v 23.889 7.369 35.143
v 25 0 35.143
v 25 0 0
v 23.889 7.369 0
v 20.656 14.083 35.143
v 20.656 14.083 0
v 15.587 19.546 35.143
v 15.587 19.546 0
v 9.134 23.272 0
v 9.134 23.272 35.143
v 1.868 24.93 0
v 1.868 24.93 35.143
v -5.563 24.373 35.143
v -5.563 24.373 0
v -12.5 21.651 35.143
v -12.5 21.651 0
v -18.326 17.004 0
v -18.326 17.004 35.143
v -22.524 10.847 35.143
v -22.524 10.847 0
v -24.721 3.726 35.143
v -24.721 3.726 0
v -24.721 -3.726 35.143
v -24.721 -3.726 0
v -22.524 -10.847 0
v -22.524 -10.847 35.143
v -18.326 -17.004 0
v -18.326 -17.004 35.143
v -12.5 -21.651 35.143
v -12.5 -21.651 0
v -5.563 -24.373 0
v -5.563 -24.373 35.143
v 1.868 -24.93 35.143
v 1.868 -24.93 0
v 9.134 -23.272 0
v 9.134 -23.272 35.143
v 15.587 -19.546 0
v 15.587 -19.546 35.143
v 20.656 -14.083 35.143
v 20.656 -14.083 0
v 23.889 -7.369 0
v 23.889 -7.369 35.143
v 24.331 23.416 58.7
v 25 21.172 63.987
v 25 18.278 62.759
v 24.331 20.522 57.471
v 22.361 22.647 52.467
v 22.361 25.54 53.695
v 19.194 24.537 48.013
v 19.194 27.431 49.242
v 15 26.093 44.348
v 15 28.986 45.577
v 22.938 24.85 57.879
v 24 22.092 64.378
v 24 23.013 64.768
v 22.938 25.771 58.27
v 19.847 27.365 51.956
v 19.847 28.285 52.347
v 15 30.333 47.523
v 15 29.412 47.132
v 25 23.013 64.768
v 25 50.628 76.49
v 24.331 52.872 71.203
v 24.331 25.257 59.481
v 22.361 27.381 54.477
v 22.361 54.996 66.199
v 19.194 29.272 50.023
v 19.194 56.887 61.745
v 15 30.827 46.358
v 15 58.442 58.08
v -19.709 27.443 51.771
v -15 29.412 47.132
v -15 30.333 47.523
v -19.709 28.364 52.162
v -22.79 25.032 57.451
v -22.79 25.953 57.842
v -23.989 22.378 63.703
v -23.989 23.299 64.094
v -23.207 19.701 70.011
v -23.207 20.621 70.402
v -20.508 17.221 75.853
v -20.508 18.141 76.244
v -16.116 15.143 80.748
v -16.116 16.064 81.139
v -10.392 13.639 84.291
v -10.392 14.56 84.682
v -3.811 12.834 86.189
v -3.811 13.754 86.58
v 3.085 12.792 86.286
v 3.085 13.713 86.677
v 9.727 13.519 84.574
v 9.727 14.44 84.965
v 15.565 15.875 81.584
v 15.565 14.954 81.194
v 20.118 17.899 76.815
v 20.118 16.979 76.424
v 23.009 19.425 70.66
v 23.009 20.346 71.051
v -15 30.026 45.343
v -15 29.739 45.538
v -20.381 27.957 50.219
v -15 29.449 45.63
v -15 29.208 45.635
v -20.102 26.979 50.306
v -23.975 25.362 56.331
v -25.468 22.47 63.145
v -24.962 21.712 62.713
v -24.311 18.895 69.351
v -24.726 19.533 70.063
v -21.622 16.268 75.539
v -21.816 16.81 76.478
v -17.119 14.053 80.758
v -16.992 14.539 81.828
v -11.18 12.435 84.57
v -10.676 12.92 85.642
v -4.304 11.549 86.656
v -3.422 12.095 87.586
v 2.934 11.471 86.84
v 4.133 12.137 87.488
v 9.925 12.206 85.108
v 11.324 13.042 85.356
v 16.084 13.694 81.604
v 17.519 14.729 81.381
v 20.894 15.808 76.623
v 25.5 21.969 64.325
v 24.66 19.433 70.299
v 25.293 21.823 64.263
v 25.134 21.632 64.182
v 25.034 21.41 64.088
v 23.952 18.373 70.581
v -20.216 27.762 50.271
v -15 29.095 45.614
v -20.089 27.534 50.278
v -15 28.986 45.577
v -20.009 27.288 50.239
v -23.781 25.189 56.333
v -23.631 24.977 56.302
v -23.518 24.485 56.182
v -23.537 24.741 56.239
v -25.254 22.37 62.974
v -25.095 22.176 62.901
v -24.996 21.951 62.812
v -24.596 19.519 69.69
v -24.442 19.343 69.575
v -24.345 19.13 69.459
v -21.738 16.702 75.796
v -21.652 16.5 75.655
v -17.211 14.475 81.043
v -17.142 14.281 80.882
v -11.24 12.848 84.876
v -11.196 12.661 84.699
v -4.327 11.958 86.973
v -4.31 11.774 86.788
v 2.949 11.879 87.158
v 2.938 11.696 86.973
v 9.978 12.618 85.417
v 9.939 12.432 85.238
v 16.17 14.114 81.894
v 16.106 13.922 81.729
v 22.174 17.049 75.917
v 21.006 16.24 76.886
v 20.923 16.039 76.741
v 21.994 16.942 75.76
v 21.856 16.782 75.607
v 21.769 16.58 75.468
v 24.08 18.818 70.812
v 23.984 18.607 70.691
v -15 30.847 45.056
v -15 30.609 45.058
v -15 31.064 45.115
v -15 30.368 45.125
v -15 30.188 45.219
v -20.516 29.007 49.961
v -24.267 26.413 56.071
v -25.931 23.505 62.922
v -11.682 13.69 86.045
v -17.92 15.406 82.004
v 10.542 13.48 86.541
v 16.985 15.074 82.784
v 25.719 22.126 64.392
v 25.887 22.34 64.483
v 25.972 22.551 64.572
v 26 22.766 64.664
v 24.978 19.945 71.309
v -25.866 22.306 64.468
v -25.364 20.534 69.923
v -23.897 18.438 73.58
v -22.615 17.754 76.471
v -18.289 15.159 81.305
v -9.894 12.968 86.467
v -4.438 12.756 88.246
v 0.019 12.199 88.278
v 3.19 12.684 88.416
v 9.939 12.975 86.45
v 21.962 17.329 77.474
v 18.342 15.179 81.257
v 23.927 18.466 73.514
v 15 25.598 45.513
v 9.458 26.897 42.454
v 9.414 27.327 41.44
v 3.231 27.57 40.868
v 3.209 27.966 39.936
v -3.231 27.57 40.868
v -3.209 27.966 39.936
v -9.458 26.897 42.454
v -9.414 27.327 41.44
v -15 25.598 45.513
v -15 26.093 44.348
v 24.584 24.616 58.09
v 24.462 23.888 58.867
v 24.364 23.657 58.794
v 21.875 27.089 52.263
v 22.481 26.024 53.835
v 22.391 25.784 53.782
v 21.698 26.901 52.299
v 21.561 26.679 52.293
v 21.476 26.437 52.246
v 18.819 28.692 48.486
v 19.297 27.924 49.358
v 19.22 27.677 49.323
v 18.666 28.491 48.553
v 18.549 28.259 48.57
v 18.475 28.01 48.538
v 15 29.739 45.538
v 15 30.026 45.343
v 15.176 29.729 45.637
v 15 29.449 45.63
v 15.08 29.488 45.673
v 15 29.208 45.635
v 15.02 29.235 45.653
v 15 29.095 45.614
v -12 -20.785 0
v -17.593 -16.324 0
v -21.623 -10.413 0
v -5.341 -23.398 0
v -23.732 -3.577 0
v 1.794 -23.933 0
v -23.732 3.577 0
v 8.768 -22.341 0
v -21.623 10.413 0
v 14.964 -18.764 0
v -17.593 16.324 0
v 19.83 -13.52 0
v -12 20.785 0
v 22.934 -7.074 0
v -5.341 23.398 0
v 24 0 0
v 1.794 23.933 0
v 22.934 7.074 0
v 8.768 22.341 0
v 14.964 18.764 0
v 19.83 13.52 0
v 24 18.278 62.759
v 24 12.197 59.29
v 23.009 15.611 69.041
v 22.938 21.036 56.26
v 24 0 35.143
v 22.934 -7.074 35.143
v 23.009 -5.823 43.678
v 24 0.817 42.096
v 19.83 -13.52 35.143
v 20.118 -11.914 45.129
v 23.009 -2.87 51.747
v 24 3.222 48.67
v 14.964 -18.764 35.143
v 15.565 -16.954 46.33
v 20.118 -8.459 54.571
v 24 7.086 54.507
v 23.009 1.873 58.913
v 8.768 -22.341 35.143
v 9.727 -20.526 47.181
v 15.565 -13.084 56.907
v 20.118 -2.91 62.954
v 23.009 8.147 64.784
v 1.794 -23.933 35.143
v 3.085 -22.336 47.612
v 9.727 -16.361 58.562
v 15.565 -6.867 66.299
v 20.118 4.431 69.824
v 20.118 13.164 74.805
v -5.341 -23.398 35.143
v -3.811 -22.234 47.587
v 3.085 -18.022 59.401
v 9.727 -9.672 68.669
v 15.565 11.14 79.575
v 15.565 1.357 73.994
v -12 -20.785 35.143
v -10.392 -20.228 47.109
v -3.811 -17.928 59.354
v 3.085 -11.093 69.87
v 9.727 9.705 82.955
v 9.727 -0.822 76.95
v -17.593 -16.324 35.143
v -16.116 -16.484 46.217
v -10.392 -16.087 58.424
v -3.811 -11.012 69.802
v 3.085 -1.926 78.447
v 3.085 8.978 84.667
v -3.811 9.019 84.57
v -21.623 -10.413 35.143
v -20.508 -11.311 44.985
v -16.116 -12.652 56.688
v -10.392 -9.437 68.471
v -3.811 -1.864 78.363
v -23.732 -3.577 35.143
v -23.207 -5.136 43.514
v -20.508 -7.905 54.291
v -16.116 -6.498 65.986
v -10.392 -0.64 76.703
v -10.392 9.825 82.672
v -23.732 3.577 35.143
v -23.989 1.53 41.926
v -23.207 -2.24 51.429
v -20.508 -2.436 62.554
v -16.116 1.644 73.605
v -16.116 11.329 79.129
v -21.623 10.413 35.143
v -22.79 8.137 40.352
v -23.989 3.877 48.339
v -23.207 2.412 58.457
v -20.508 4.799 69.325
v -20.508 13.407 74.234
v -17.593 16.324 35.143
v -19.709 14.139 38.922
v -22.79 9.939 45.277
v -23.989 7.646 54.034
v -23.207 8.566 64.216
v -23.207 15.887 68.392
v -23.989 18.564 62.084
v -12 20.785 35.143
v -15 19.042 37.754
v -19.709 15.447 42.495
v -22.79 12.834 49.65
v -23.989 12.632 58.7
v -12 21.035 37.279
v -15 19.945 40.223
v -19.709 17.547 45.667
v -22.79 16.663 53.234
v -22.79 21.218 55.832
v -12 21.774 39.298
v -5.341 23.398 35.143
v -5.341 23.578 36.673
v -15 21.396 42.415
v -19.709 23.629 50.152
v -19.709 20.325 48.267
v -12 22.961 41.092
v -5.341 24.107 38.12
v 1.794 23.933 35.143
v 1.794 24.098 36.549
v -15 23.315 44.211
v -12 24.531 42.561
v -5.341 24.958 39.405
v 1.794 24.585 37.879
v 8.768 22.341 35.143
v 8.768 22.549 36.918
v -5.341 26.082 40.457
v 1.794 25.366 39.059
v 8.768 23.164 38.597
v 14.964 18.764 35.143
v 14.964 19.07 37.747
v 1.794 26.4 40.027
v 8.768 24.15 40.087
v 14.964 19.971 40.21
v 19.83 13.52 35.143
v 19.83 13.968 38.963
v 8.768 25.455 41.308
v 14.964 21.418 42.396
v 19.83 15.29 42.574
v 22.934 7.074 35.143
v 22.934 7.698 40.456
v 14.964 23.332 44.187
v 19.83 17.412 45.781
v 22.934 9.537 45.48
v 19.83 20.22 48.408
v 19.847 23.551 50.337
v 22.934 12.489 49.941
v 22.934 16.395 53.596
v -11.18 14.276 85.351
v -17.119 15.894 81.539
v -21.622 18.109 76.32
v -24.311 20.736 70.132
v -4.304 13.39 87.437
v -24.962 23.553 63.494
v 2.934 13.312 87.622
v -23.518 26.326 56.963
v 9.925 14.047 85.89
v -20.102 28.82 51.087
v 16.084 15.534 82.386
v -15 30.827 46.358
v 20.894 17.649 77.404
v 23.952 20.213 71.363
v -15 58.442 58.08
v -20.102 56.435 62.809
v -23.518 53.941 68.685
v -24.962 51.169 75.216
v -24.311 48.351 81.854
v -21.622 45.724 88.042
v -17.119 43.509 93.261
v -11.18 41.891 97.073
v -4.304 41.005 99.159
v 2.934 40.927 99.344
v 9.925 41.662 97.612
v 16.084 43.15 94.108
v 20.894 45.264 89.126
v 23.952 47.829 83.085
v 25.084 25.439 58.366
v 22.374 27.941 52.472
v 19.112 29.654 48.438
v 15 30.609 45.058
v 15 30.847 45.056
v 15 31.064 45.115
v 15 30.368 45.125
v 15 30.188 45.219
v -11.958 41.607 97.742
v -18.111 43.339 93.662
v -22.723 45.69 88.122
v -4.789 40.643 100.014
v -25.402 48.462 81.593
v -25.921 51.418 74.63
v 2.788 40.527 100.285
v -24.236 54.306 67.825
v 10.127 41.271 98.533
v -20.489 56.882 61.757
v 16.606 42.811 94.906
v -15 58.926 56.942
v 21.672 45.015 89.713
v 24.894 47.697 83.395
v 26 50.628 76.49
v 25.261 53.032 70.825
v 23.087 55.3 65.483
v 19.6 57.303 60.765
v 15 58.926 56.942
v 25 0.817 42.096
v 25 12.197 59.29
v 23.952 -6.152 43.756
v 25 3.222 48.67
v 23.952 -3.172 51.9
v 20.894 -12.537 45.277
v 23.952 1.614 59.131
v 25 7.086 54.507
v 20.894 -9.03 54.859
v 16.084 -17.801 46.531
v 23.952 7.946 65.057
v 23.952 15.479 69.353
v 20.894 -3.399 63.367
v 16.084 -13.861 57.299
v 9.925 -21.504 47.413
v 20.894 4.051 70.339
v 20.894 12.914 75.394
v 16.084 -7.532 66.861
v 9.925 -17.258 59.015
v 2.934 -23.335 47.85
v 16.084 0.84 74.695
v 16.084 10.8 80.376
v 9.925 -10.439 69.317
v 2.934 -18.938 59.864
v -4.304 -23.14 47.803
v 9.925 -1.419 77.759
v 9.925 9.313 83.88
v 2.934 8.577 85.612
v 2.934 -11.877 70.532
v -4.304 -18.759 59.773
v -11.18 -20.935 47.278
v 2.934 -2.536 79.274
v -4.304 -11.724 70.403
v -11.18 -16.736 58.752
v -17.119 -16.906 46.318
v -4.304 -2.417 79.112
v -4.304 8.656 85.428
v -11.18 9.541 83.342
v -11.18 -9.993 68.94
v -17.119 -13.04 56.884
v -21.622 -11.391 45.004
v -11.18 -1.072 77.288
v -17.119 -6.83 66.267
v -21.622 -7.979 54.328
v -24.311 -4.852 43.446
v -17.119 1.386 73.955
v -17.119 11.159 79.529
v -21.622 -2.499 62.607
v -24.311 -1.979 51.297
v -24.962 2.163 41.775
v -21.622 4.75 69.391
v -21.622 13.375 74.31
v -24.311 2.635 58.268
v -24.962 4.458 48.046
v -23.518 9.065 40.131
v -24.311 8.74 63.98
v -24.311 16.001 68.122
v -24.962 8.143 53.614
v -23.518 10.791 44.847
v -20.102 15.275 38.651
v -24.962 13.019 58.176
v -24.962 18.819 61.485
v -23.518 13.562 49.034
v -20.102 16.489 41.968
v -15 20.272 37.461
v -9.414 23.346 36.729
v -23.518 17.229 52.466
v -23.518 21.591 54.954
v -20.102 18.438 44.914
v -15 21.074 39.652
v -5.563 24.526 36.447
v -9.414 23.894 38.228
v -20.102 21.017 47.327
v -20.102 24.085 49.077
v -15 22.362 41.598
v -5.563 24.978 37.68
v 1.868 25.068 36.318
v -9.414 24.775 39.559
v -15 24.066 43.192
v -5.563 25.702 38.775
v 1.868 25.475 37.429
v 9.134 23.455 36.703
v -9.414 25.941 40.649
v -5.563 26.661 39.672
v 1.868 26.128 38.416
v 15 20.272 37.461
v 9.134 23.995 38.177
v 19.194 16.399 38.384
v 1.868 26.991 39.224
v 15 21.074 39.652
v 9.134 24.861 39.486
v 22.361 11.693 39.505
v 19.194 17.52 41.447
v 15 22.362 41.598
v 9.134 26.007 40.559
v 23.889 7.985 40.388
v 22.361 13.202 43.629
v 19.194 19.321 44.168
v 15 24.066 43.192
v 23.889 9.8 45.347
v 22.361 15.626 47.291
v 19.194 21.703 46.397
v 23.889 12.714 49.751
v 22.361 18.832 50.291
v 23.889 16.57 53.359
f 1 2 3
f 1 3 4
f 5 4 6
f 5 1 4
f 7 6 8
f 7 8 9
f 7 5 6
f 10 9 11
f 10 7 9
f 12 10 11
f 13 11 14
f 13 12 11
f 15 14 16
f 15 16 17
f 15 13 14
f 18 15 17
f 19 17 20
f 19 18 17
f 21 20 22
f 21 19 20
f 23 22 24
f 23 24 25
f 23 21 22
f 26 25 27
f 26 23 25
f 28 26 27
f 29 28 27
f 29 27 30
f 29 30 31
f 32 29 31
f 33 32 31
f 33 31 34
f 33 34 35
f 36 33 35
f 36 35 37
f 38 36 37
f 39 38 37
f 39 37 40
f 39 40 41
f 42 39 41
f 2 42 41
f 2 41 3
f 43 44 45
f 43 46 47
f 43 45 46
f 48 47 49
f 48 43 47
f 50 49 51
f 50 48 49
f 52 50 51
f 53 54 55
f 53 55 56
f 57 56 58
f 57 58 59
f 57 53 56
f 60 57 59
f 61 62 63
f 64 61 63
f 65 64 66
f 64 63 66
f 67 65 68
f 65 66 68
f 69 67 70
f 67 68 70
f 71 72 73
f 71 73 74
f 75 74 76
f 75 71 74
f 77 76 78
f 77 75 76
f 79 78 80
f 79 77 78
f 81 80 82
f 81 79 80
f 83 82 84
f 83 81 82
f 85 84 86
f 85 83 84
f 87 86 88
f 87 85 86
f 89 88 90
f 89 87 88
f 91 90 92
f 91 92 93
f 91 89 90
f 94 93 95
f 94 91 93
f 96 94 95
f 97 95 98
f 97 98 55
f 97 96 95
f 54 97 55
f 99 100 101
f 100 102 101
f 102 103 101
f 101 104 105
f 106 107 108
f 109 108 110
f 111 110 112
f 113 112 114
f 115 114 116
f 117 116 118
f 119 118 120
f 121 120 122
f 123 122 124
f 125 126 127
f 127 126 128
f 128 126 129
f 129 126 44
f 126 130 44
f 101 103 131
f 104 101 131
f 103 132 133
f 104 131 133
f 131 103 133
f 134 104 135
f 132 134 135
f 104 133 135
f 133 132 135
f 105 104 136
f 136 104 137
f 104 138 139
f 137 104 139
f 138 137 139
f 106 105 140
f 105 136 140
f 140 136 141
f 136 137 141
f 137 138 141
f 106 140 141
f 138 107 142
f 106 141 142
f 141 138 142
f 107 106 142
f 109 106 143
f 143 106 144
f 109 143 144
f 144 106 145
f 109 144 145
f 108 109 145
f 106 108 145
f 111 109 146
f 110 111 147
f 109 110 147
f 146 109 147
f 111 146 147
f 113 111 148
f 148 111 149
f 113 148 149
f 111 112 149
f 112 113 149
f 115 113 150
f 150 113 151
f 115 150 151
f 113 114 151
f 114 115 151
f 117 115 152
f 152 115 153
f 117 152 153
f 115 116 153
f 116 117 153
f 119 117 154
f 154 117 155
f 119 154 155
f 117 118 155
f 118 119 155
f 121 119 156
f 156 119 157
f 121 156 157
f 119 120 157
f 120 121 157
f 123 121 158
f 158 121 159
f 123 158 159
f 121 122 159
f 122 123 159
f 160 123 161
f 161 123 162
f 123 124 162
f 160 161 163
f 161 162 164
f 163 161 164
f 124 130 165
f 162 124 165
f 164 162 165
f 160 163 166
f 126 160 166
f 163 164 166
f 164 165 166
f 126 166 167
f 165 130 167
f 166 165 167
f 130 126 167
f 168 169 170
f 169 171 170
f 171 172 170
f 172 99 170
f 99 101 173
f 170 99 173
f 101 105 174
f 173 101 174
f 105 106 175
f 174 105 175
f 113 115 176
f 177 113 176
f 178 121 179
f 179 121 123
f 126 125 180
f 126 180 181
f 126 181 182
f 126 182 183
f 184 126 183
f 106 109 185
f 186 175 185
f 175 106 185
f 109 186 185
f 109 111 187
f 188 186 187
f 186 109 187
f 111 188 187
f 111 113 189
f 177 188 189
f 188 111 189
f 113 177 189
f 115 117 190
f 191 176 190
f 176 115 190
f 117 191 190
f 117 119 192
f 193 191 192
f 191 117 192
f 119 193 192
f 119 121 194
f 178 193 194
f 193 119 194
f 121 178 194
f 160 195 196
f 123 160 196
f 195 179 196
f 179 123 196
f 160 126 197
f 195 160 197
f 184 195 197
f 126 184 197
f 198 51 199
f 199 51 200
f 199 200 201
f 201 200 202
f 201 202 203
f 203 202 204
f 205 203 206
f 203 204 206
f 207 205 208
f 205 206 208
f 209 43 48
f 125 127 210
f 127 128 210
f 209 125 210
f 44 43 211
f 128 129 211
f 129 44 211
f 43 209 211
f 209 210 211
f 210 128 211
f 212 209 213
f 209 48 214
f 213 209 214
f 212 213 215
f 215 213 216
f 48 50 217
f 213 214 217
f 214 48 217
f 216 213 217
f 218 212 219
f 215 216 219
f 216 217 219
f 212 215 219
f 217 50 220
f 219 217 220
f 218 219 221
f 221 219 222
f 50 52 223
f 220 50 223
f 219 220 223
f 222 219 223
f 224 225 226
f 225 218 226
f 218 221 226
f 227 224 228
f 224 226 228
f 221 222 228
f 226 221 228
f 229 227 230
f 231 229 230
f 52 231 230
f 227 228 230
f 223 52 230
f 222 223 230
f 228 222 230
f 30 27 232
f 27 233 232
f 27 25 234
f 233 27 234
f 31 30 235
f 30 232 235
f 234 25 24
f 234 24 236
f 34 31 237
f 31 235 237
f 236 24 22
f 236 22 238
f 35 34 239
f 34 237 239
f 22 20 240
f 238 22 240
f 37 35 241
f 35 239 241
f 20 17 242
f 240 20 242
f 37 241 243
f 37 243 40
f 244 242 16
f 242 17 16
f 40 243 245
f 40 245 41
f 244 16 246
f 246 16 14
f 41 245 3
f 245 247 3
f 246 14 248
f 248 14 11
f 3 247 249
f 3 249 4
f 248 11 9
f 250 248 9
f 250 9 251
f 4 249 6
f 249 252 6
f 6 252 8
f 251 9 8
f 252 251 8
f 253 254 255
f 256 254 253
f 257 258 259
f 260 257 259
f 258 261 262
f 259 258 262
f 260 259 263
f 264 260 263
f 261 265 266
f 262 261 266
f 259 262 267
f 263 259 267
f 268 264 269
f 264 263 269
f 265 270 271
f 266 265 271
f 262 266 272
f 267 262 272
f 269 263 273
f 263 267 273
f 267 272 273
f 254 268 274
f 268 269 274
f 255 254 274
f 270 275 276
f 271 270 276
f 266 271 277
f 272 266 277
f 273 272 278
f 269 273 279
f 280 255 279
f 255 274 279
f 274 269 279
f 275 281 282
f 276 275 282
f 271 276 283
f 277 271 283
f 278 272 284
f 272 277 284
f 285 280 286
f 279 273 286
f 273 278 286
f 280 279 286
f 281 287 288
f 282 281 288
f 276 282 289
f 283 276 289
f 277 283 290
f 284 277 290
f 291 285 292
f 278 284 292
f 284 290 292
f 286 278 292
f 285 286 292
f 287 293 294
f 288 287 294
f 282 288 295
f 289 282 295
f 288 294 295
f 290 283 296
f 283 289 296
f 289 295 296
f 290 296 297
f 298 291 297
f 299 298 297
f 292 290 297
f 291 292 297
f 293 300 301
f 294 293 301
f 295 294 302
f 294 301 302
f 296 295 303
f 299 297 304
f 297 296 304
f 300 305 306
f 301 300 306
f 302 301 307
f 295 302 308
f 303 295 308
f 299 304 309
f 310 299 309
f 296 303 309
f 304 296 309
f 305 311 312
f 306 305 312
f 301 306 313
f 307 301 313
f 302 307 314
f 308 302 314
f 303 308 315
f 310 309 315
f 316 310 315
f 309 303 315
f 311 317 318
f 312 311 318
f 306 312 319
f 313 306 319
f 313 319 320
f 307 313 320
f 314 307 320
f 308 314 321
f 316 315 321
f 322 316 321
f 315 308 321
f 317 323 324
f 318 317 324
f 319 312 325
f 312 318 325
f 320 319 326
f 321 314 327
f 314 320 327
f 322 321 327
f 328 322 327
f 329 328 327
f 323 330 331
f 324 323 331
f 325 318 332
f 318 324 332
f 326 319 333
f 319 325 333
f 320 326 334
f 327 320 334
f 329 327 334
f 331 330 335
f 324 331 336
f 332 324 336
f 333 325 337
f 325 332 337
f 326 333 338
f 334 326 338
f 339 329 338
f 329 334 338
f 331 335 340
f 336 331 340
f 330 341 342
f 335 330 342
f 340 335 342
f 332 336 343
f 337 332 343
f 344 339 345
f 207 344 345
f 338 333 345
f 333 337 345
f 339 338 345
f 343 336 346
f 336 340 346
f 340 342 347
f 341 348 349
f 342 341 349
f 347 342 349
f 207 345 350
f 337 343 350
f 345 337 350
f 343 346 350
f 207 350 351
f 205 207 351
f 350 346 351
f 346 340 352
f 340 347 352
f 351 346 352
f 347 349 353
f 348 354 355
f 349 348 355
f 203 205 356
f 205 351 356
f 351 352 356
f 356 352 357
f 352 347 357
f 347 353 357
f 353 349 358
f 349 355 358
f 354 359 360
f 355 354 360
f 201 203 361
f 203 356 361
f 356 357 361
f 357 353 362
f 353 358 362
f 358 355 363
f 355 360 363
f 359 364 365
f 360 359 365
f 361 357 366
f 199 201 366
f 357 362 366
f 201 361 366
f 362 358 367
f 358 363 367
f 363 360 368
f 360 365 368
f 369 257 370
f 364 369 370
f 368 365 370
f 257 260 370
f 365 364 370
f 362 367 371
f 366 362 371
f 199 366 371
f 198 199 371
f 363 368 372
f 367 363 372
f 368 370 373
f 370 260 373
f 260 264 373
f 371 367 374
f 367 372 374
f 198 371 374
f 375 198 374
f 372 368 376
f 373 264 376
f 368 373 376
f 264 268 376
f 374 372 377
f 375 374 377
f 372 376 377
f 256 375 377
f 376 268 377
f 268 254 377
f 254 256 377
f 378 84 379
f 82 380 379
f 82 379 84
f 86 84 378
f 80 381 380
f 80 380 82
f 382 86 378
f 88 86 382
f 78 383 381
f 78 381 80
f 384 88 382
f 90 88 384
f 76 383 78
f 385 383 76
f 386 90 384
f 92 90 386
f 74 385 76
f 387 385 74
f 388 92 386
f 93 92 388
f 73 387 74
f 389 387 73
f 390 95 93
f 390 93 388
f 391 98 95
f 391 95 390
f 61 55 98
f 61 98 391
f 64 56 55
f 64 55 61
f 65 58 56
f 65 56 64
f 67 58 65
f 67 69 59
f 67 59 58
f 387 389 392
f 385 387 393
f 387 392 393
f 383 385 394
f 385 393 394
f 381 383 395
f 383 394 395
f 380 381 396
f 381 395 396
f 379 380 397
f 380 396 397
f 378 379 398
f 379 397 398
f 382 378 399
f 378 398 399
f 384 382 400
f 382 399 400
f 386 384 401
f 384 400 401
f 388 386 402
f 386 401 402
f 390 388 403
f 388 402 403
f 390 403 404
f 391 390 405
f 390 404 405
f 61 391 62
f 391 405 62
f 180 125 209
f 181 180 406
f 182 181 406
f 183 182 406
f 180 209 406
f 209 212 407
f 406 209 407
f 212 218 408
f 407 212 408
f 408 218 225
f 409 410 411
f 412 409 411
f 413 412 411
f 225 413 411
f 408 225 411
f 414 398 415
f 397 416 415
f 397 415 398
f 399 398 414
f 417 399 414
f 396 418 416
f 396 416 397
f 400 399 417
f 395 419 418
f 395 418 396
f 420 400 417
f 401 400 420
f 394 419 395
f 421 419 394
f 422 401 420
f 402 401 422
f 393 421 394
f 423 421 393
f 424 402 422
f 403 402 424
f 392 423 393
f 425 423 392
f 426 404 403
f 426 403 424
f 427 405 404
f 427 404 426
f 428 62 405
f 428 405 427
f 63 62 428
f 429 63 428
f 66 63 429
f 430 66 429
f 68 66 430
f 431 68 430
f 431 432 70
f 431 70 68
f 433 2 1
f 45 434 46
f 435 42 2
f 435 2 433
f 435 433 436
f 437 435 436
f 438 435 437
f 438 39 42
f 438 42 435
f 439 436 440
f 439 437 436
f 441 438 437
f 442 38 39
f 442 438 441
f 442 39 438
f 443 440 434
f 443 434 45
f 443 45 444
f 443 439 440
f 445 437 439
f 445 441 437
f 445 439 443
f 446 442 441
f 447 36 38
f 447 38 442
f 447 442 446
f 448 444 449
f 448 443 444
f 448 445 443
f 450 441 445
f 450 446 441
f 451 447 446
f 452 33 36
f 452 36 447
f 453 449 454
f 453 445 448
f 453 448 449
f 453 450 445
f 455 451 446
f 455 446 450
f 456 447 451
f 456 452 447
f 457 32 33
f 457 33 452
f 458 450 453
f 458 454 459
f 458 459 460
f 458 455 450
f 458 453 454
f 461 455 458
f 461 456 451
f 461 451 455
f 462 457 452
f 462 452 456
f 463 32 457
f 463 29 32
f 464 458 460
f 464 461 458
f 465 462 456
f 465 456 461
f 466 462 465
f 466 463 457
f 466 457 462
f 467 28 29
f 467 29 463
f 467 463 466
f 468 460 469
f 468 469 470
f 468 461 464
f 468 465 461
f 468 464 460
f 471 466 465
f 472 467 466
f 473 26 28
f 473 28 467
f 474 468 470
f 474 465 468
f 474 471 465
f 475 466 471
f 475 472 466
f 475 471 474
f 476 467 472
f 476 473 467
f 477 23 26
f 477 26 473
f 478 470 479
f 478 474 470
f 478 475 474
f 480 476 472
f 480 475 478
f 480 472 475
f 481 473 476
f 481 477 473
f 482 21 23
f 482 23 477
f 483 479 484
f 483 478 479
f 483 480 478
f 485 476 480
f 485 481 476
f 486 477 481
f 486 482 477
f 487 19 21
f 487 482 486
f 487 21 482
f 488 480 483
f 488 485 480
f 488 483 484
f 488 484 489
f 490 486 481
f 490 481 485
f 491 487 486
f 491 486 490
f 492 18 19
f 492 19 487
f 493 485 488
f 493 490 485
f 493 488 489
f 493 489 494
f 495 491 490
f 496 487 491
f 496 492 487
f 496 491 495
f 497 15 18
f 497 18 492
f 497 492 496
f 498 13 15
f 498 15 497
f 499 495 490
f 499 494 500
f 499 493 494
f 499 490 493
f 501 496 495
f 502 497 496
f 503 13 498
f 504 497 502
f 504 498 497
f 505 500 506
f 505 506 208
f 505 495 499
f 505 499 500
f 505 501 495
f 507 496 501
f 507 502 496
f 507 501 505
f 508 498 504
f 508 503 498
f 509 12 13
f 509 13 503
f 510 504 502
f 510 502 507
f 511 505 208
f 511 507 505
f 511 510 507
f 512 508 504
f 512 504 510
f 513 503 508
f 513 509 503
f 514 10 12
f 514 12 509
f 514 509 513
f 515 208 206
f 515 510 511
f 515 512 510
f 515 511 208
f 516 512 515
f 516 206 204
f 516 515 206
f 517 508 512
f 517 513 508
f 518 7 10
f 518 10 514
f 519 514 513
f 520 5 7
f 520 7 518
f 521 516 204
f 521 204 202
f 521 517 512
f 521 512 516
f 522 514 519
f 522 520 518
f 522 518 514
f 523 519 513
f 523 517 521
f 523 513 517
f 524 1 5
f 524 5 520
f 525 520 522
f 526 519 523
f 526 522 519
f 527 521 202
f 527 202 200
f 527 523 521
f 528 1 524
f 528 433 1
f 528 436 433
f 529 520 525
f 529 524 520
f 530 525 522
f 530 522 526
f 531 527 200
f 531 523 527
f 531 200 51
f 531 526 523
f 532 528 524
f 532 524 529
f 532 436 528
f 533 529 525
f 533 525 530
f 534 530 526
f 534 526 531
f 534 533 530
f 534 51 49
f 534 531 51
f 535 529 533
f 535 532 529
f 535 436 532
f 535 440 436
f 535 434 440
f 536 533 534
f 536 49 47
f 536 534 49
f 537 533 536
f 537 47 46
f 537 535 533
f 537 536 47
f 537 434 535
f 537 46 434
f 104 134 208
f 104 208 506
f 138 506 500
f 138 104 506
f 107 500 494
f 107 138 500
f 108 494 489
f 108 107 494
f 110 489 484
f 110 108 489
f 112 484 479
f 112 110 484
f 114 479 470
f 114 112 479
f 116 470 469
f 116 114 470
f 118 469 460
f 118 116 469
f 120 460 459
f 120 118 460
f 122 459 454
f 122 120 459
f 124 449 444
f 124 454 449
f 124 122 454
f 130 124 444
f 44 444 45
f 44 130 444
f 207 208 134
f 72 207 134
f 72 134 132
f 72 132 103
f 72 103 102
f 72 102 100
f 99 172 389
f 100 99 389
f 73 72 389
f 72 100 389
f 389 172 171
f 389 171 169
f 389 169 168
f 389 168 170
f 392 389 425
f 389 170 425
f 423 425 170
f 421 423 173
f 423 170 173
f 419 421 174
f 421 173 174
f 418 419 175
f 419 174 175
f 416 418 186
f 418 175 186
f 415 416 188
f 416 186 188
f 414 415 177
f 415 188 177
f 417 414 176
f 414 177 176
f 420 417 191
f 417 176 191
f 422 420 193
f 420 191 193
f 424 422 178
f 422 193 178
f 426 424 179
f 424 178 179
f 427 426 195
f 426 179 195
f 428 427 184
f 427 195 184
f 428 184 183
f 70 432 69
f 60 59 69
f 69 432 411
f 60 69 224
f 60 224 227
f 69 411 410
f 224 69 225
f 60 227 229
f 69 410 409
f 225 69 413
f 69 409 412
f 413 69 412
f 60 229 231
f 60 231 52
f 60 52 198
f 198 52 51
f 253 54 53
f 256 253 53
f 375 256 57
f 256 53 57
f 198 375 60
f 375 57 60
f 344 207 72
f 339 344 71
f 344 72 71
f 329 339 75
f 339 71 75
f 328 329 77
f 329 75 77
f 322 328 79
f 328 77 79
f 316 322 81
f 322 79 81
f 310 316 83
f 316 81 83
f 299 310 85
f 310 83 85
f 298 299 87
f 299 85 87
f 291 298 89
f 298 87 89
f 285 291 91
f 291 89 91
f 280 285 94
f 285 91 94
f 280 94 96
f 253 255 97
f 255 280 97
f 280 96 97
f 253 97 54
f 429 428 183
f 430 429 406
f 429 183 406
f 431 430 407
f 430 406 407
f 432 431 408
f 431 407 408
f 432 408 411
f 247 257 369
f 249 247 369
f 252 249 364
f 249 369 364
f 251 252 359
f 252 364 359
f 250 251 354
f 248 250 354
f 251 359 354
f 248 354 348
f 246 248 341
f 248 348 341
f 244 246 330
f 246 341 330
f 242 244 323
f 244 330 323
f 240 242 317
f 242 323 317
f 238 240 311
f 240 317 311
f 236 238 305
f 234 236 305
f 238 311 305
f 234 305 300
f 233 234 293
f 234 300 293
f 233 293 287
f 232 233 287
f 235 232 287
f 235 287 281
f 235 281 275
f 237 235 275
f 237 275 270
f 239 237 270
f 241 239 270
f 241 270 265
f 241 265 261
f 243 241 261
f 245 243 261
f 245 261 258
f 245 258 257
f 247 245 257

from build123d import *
from build123d.topology import SkipClean

# Parameters (mm, degrees)
ESQUISSE6_R             = 25
ESQUISSE6_R_2           = 24
ESQUISSE8_R             = 26
ESQUISSE8_R_2           = 24
EXTRU_MINCE1_DEPTH      = 1
EXTRU_MINCE2_START      = 30
ESQUISSE9_R             = 26
ESQUISSE9_R_2           = 25
EXTRU_MINCE2_DEPTH      = 30
CONG_1_R                = 1
CONG_2_R                = 1
ENL_V_MAT_EXTRU_1_DEPTH = 40


with BuildPart() as part:
    # Balayage-Mince2: sweep along a path in Esquisse7
    with BuildLine(Plane(origin=(0, 0, 0), x_dir=(0, 0, -1), z_dir=(1, 0, 0))) as balayage_mince2_path:
        Line((0, 0), (-35.14343316412919, -3.47e-15))
        ThreePointArc((-35.14343316412919, -3.47e-15), (-51.70154272349097, 4.983425337984965), (-62.75857876770245, 18.27806614532184))
        Line((-62.75857876770245, 18.27806614532184), (-64.37754708374251, 22.092116482858586))
    # Esquisse6 → Balayage-Mince2 (sweep)
    with BuildSketch(Plane.XY):
        Circle(ESQUISSE6_R)
        Circle(ESQUISSE6_R_2, mode=Mode.SUBTRACT)
    sweep(path=balayage_mince2_path.line)



with BuildPart() as body_2:
    # Esquisse8 → Extru.-Mince1 (new body)
    with BuildSketch(Plane(origin=(0, 41.87396099217143, 17.77444189612002), x_dir=(1, 0, 0), z_dir=(0, 0.9205048534524412, 0.39073112848927183))):
        with Locations((0, -50.62776693988426)):
            Circle(ESQUISSE8_R)
        with Locations((0, -50.62776693988426)):
            Circle(ESQUISSE8_R_2, mode=Mode.SUBTRACT)
    extrude(amount=EXTRU_MINCE1_DEPTH)


with BuildPart() as part_1:
    add(part.part)

    add(body_2.part)  # Extru.-Mince2 merges body 2
    # Esquisse9 → Extru.-Mince2 (add)
    with BuildSketch(Plane(origin=(0, 42.794465845623876, 18.16517302460929), x_dir=(1, 0, 0), z_dir=(0, 0.9205048534524412, 0.39073112848927183)).offset(EXTRU_MINCE2_START)):
        with Locations((0, -50.627766939884246)):
            Circle(ESQUISSE9_R)
        with Locations((0, -50.627766939884246)):
            Circle(ESQUISSE9_R_2, mode=Mode.SUBTRACT)
    extrude(amount=-EXTRU_MINCE2_DEPTH)

    # Congé1
    cong_1_edges = [part_1.edges().sort_by_distance(p)[0] for p in [
        (-25, 22.09211648285859, 64.3775470837425),
    ]]
    fillet(cong_1_edges, radius=CONG_1_R - 0.0001)  # a hair under: the kernel refuses the full size

    # Congé2
    cong_2_edges = [part_1.edges().sort_by_distance(p)[0] for p in [
        (-26, 22.092116482858604, 64.37754708374253),
    ]]
    fillet(cong_2_edges, radius=CONG_2_R)

    # Esquisse12 → Enlèv. mat.-Extru.1 (cut)
    with SkipClean():  # the faces are left unmerged after this step: merging them gives an invalid solid
        with BuildSketch(Plane(origin=(0, 0, 0), x_dir=(1, 0, 0), z_dir=(0, -0.39073112848927455, 0.9205048534524399))):
            Polygon((-15, 76.49021206691012), (15, 76.49021206691012), (15.000000000000004, 41.34677890278088), (-14.999999999999996, 41.34677890278088), align=None)
        extrude(amount=ENL_V_MAT_EXTRU_1_DEPTH, mode=Mode.SUBTRACT)


solid = part_1.part
